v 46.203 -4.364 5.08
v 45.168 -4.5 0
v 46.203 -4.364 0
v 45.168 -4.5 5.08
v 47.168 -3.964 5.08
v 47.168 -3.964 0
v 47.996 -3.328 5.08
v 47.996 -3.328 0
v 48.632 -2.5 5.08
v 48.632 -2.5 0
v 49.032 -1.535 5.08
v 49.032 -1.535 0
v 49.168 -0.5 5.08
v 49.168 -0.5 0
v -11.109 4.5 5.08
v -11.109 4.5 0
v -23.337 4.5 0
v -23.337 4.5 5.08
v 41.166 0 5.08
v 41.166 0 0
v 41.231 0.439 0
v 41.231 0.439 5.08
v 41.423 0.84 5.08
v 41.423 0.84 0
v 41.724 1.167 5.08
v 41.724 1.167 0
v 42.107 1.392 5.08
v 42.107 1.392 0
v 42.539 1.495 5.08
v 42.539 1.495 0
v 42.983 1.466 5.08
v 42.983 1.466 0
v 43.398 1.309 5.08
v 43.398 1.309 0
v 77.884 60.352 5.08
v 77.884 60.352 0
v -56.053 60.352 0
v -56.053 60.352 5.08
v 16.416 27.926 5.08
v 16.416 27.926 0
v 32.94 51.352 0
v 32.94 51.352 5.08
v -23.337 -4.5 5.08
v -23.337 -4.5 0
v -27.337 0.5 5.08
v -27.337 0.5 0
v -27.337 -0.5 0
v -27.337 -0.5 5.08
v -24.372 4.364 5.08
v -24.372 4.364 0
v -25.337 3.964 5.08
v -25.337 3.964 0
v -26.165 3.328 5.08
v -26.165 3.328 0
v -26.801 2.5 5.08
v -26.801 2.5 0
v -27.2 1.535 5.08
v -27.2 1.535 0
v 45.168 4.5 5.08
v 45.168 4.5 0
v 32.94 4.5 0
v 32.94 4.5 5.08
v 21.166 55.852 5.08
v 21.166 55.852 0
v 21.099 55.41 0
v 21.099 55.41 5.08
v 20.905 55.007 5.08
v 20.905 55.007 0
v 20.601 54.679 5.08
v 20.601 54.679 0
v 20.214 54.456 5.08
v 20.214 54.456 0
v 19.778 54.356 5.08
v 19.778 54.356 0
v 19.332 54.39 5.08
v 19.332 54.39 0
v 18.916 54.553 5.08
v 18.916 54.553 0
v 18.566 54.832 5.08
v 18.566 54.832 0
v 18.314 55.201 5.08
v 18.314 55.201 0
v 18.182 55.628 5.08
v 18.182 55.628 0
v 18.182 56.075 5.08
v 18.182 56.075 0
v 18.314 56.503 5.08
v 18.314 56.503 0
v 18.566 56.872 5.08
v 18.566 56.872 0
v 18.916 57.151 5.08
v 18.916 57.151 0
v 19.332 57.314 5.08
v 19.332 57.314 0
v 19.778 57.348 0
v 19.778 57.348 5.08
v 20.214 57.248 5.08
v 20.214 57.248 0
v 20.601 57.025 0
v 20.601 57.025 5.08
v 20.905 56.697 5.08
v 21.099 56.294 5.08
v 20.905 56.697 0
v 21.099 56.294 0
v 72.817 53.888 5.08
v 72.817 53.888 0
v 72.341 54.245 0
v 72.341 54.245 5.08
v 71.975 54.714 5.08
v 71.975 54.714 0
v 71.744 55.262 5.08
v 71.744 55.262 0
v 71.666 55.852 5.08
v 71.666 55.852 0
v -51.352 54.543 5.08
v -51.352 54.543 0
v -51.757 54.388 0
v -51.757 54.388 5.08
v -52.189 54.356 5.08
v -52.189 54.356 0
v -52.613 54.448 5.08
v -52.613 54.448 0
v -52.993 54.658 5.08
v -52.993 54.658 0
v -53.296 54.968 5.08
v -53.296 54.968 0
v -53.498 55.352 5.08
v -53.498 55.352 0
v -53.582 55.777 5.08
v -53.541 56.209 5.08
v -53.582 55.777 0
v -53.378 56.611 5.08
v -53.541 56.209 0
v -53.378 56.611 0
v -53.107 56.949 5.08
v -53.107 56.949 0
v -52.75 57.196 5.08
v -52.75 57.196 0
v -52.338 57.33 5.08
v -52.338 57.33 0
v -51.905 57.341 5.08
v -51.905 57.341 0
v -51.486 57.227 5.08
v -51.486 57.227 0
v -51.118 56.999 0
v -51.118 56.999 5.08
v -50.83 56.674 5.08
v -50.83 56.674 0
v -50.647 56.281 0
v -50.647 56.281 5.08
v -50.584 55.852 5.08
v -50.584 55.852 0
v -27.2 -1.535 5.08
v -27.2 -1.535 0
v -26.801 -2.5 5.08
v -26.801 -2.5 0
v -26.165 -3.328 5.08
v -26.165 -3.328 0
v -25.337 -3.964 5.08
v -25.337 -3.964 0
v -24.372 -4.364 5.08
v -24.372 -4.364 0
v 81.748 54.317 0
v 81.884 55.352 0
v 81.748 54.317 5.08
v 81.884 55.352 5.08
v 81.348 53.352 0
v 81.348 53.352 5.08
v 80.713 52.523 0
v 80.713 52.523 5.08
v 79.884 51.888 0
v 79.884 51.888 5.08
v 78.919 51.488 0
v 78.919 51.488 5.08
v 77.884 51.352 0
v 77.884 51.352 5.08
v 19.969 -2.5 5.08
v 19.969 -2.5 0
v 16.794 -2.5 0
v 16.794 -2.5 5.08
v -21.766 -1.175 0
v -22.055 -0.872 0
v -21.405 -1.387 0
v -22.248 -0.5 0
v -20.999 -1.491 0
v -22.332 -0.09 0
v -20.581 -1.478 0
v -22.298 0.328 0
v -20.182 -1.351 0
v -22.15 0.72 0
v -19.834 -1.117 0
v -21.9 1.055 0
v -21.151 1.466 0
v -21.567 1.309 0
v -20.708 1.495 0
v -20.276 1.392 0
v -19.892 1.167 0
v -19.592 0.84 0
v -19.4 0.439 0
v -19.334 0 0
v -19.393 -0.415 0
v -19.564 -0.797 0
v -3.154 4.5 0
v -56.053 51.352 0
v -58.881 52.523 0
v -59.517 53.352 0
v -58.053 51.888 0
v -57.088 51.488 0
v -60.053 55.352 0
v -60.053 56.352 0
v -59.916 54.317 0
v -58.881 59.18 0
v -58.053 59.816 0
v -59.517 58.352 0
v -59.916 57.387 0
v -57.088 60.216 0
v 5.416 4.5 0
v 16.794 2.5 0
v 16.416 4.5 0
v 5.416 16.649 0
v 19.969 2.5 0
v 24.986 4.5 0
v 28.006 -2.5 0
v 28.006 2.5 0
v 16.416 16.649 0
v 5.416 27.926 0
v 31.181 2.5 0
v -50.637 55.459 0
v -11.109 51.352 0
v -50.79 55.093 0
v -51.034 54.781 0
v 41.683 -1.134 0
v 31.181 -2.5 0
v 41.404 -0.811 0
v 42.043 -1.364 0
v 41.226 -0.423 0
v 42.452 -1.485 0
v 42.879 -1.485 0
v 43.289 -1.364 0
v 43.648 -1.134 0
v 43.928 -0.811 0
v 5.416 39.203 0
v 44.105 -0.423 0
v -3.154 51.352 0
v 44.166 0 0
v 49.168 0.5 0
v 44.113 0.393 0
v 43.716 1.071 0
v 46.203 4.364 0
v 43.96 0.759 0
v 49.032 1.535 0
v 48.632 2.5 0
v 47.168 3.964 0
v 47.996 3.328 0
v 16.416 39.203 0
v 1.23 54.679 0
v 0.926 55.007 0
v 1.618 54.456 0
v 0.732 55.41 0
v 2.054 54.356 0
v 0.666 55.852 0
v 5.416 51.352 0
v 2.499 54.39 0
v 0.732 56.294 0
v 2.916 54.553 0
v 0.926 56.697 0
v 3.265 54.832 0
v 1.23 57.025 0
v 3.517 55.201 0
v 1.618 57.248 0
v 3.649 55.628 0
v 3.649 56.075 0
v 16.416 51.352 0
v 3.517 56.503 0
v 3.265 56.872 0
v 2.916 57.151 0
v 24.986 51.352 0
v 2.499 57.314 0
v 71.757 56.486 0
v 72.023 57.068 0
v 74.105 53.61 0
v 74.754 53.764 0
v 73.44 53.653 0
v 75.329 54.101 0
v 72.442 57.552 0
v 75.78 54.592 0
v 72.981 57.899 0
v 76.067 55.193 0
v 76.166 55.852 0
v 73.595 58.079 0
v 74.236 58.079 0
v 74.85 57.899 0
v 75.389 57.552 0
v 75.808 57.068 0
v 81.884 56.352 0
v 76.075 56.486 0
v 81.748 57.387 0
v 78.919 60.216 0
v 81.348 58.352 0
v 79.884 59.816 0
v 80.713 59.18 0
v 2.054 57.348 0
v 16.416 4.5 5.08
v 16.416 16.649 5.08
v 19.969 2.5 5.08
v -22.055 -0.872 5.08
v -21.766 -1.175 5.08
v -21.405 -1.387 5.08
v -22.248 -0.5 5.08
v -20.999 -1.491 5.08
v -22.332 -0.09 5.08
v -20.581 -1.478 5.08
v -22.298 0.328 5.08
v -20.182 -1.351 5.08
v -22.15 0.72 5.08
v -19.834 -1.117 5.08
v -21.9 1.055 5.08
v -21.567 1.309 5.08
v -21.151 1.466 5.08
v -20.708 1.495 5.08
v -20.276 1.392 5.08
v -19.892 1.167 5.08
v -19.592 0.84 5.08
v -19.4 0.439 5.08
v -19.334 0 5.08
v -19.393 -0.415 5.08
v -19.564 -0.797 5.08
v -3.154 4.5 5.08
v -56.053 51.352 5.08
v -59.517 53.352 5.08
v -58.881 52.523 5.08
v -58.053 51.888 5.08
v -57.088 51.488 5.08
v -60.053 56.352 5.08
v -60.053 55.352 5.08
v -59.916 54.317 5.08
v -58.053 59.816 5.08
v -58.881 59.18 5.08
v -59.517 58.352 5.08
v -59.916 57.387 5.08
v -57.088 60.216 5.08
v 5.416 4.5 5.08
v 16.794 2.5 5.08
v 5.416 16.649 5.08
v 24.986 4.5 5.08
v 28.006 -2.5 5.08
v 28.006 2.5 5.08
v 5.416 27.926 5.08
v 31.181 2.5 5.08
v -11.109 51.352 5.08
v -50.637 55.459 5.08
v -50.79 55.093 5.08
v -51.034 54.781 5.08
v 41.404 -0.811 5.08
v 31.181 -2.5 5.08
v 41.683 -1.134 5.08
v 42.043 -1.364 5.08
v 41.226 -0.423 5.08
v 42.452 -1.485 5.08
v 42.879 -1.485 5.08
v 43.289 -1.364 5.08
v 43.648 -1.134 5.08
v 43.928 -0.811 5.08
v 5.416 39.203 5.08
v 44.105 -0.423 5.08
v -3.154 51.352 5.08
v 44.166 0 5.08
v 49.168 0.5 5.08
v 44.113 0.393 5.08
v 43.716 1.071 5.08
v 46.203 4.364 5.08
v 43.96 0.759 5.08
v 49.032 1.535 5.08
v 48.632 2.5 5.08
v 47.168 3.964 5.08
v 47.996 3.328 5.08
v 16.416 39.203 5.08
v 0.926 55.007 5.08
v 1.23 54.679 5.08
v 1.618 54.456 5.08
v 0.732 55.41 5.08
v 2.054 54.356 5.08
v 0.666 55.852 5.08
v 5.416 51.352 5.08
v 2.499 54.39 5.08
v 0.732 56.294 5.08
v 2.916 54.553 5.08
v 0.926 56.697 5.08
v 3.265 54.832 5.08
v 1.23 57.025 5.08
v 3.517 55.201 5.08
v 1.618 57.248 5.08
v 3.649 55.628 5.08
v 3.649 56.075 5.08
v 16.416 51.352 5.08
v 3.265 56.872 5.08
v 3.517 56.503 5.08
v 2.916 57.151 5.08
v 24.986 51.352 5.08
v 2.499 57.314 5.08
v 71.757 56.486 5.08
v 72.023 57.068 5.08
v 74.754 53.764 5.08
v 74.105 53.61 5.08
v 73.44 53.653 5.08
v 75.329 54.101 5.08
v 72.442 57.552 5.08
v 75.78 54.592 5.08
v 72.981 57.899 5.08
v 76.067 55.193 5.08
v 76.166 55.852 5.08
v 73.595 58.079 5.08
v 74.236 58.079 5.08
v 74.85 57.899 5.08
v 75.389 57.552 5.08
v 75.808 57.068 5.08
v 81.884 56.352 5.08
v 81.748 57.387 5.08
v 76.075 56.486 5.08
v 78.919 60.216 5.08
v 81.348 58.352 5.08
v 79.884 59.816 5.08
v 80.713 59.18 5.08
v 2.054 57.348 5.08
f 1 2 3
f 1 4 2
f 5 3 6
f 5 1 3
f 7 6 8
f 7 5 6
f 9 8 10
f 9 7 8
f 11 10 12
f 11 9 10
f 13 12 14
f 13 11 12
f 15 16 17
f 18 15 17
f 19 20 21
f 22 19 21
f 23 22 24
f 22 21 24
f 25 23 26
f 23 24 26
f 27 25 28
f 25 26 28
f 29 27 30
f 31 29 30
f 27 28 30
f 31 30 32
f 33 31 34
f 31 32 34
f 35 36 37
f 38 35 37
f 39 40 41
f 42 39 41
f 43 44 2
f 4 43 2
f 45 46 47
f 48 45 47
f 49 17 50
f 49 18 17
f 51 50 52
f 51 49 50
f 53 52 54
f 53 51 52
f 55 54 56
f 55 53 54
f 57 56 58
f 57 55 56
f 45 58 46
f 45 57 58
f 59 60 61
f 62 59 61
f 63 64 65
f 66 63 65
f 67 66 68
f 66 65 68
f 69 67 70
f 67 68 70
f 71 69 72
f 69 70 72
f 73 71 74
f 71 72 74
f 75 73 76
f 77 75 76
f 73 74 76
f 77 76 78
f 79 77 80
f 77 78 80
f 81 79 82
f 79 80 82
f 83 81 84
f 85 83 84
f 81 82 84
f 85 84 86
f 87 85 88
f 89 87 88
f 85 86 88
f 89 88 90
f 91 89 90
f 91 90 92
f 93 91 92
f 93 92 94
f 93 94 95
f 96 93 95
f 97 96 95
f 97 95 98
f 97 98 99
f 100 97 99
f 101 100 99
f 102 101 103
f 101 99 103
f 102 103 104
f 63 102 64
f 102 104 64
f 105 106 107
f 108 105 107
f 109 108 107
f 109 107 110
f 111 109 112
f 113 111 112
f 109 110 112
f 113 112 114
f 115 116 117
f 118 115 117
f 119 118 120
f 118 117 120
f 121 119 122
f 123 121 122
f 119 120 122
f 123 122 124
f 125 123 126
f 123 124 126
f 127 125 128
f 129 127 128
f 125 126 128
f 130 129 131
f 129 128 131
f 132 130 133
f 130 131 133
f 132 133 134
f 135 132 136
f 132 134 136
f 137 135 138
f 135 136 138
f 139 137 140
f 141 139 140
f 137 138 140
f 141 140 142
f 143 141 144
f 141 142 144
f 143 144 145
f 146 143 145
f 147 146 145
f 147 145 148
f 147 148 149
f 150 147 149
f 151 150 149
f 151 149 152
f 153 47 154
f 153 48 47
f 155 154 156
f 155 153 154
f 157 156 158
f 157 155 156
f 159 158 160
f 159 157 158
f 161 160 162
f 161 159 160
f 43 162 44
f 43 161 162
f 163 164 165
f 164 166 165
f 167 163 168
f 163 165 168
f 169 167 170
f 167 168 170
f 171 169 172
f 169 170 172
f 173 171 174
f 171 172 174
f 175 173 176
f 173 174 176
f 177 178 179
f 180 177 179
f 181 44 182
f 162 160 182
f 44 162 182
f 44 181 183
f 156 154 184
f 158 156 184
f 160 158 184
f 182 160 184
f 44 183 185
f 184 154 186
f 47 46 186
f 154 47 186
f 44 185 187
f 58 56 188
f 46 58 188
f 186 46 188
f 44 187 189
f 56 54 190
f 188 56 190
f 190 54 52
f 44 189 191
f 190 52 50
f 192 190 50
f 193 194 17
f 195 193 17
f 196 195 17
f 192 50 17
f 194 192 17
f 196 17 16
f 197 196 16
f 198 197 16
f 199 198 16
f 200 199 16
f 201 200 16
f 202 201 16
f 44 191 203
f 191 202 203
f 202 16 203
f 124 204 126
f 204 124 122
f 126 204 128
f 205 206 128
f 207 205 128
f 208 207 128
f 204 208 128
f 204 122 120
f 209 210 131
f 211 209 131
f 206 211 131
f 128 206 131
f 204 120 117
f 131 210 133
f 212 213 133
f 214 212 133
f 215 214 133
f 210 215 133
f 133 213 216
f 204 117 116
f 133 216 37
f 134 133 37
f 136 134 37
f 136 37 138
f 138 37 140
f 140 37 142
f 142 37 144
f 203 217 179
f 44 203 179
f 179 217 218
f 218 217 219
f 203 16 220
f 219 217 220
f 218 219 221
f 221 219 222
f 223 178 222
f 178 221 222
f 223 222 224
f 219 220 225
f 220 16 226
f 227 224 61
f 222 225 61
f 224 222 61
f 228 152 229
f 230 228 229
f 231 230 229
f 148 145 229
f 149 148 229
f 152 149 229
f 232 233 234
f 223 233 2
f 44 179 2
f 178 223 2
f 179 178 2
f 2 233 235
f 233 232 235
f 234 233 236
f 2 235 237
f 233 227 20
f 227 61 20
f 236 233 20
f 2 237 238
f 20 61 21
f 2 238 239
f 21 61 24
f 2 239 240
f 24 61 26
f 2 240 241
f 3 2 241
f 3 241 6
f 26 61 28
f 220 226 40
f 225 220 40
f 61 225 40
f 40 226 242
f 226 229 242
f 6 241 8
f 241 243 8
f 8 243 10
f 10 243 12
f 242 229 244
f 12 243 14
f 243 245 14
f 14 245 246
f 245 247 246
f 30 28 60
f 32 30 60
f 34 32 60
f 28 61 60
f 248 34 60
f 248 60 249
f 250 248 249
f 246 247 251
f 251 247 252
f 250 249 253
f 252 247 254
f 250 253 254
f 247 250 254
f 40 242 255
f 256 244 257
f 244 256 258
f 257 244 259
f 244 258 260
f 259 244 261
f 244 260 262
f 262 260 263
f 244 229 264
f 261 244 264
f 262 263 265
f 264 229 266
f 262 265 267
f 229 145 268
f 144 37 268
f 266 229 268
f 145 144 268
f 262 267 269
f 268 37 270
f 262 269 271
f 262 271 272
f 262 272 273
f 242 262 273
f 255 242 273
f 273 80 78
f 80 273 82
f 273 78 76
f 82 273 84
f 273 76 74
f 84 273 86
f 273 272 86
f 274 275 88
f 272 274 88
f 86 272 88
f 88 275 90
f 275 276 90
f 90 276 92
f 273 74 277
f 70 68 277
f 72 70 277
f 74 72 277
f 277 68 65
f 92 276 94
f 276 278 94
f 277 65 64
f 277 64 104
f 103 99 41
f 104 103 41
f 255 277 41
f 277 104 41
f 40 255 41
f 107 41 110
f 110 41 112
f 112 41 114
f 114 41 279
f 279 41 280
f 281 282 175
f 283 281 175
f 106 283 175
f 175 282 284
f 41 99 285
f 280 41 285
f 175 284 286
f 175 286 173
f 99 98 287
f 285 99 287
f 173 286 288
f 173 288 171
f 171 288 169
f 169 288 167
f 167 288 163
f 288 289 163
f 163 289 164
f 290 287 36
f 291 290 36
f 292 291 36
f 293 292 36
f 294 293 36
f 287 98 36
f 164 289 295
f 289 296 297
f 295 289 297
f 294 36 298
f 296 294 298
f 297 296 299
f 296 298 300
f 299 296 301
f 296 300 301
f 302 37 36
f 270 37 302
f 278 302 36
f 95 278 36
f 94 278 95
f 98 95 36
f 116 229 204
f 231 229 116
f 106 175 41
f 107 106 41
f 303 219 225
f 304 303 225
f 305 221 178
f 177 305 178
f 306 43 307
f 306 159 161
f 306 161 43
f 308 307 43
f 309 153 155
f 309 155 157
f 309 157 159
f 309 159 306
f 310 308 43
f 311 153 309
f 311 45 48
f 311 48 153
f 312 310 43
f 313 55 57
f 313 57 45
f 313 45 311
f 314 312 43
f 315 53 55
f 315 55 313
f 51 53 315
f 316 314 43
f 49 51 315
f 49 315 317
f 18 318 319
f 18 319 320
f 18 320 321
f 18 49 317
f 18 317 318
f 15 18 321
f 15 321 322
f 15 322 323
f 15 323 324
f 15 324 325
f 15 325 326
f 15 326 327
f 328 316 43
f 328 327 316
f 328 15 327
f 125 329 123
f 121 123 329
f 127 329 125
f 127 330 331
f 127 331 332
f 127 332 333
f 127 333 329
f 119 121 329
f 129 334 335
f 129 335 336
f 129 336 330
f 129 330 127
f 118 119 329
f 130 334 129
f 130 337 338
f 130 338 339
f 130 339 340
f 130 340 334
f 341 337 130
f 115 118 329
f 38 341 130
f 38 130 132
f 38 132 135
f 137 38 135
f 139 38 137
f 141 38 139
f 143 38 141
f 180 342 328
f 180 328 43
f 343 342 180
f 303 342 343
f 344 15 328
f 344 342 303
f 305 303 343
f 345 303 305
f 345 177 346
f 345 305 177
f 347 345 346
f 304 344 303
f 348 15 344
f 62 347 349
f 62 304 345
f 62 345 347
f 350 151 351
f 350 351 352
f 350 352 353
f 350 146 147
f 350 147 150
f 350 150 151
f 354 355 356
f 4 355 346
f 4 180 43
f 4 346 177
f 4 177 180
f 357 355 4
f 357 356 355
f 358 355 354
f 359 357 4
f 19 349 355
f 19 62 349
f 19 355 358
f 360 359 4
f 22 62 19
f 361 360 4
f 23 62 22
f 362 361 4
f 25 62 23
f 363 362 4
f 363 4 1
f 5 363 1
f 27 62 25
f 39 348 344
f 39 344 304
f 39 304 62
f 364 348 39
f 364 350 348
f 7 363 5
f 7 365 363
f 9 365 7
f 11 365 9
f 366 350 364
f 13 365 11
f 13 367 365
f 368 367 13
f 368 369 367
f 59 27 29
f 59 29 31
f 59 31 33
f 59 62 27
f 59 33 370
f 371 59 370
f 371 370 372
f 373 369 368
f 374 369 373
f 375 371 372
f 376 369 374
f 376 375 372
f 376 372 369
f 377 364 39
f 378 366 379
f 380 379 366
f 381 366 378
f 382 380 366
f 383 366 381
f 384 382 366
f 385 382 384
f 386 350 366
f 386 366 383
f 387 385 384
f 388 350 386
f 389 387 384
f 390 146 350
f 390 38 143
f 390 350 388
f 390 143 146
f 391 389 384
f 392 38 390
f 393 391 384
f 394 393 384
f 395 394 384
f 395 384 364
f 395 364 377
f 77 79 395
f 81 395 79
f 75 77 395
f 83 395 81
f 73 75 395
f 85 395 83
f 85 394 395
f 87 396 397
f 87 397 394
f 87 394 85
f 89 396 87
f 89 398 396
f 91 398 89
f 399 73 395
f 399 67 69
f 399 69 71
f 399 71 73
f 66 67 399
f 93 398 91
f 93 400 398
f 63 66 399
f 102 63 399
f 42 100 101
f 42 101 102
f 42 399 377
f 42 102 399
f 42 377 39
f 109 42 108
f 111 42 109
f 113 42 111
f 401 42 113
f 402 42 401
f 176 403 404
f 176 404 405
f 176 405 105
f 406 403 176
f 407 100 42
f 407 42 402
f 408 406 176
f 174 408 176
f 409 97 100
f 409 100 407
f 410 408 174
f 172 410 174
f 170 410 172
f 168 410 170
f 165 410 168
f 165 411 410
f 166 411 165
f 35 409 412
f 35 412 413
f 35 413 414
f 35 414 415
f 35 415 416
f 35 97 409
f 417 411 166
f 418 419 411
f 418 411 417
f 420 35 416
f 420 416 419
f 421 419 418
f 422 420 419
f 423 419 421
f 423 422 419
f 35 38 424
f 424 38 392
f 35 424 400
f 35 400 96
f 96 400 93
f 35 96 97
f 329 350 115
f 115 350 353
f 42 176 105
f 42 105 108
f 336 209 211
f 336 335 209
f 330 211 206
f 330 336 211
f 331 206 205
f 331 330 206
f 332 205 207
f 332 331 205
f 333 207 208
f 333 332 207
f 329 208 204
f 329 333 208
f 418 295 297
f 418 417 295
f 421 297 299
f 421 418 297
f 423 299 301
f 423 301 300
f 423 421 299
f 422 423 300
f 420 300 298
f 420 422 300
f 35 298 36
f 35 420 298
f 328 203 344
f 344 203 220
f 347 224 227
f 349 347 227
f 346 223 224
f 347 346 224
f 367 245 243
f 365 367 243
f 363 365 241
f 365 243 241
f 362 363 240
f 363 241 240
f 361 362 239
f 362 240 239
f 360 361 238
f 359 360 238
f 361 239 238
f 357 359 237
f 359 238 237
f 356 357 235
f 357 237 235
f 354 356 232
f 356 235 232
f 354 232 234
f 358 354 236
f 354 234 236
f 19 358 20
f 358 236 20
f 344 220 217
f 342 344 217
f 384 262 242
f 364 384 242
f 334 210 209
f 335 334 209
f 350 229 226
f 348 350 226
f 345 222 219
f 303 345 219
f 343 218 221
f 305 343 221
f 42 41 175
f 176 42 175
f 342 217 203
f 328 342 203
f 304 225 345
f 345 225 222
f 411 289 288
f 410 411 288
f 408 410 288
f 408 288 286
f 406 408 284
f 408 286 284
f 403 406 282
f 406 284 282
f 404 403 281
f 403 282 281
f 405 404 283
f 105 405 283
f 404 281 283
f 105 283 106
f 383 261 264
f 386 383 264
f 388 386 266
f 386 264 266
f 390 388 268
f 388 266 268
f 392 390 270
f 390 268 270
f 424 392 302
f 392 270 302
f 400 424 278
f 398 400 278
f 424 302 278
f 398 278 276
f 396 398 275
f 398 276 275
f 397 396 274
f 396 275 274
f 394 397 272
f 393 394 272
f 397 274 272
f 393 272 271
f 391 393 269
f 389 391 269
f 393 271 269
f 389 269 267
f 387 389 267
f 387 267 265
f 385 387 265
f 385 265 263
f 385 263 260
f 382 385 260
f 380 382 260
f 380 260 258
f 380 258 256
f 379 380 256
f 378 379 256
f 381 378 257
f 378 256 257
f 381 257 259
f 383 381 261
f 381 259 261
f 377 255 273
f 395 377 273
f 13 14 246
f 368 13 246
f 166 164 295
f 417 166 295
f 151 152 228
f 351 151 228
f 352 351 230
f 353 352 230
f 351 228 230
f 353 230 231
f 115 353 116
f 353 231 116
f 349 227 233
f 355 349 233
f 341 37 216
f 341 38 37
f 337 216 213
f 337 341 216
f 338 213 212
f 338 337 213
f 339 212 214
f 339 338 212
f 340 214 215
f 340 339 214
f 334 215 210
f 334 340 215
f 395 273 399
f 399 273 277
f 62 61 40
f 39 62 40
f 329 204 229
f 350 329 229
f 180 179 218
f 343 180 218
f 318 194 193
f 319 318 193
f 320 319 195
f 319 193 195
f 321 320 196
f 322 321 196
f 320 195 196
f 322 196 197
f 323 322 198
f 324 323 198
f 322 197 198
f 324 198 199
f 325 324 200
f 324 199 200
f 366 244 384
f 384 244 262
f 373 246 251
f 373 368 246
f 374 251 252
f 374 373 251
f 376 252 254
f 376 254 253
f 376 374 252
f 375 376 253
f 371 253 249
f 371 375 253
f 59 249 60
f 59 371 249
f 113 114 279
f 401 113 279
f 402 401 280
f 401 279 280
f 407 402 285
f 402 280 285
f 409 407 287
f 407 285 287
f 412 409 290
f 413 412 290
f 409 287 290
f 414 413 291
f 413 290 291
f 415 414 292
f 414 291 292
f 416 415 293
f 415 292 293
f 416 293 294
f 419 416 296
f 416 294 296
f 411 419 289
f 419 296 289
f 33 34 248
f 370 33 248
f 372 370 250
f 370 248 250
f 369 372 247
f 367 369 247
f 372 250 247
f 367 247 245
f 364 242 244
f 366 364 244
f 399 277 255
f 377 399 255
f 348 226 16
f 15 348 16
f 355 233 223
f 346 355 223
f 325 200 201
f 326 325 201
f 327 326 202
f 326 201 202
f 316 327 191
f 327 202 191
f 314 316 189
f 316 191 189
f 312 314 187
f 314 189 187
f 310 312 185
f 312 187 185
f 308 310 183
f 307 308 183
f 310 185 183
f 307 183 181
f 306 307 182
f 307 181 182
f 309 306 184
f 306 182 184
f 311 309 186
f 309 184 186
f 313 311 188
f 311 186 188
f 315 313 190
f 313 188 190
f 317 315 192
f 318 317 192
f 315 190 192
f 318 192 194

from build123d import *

# Parameters (mm, degrees)
F1_DEPTH = 5.08
F2_R     = 4


# Not quite as in the source:
# - a feature names something its author has since deleted; it is built from what else it names


with BuildPart() as f1:
    # F0 (on Top) → F1 (new body)
    with BuildSketch(Plane.XY):
        with BuildLine():
            Line((0.6656670719, 55.8519247654), (-50.5843329281, 55.8519247654))
            ThreePointArc((-50.5843329281, 55.8519247654), (-50.7903791398, 55.0931866065), (-51.3519110531, 54.5428952787))
            Line((-51.3519110531, 54.5428952787), (-49.566514597, 51.3519247654))
            Line((-49.566514597, 51.3519247654), (-11.1088099211, 51.3519247654))
            Line((-11.1088099211, 51.3519247654), (-3.1543997556, 51.3519247654))
            Line((-3.1543997556, 51.3519247654), (5.4156670719, 51.3519247654))
            Line((5.4156670719, 51.3519247654), (10.9156670719, 51.3519247654))
            Line((10.9156670719, 51.3519247654), (10.9156670719, 55.8519247654))
            Line((10.9156670719, 55.8519247654), (3.6656670719, 55.8519247654))
            ThreePointArc((3.6656670719, 55.8519247654), (2.1656670719, 54.3519247654), (0.6656670719, 55.8519247654))
        make_face()
        with BuildLine():
            Line((-11.1088099211, 4.5), (-23.3521512592, 4.5))
            Line((-23.3521512592, 4.5), (-21.5667548031, 1.3090294867))
            ThreePointArc((-21.5667548031, 1.3090294867), (-20.0755947692, 1.2939537883), (-19.3343329281, 0))
            Line((-19.3343329281, 0), (10.9156670719, 0))
            Line((10.9156670719, 0), (10.9156670719, 4.5))
            Line((10.9156670719, 4.5), (5.4156670719, 4.5))
            Line((5.4156670719, 4.5), (-3.1543997556, 4.5))
            Line((-3.1543997556, 4.5), (-11.1088099211, 4.5))
        make_face()
        with BuildLine():
            ThreePointArc((-51.3519110531, 54.5428952787), (-53.3782867164, 56.6106629243), (-50.5843329281, 55.8519247654))
            Line((-50.5843329281, 55.8519247654), (0.6656670719, 55.8519247654))
            ThreePointArc((0.6656670719, 55.8519247654), (2.1656670719, 57.3519247654), (3.6656670719, 55.8519247654))
            Line((3.6656670719, 55.8519247654), (10.9156670719, 55.8519247654))
            Line((10.9156670719, 55.8519247654), (18.1656670719, 55.8519247654))
            ThreePointArc((18.1656670719, 55.8519247654), (19.6656670719, 57.3519247654), (21.1656670719, 55.8519247654))
            Line((21.1656670719, 55.8519247654), (71.6656670719, 55.8519247654))
            ThreePointArc((71.6656670719, 55.8519247654), (73.9156670719, 58.1019247654), (76.1656670719, 55.8519247654))
            ThreePointArc((76.1656670719, 55.8519247654), (75.0537743102, 53.910994083), (72.8170342594, 53.8883805354))
            Line((72.8170342594, 53.8883805354), (71.3978487408, 51.3519247654))
            Line((71.3978487408, 51.3519247654), (81.8841302488, 51.3519247654))
            Line((81.8841302488, 51.3519247654), (81.8841302488, 60.3519247654))
            Line((81.8841302488, 60.3519247654), (-60.052796105, 60.3519247654))
            Line((-60.052796105, 60.3519247654), (-60.052796105, 51.3519247654))
            Line((-60.052796105, 51.3519247654), (-49.566514597, 51.3519247654))
            Line((-49.566514597, 51.3519247654), (-51.3519110531, 54.5428952787))
        make_face()
        with BuildLine():
            Line((-21.5667548031, 1.3090294867), (-23.3521512592, 4.5))
            Line((-23.3521512592, 4.5), (-27.3365851734, 4.5))
            Line((-27.3365851734, 4.5), (-27.3365851734, -4.5))
            Line((-27.3365851734, -4.5), (49.1679193172, -4.5))
            Line((49.1679193172, -4.5), (49.1679193172, 4.5))
            Line((49.1679193172, 4.5), (45.183485403, 4.5))
            Line((45.183485403, 4.5), (43.3980889469, 1.3090294867))
            ThreePointArc((43.3980889469, 1.3090294867), (43.9596208602, 0.7587381589), (44.1656670719, 0))
            ThreePointArc((44.1656670719, 0), (42.6656670719, -1.5), (41.1656670719, 0))
            Line((41.1656670719, 0), (31.1806510627, 0))
            Line((31.1806510627, 0), (31.1806510627, -2.5))
            Line((31.1806510627, -2.5), (28.0056510627, -2.5))
            Line((28.0056510627, -2.5), (28.0056510627, 0))
            Line((28.0056510627, 0), (19.9686510627, 0))
            Line((19.9686510627, 0), (19.9686510627, -2.5))
            Line((19.9686510627, -2.5), (16.7936510627, -2.5))
            Line((16.7936510627, -2.5), (16.7936510627, 0))
            Line((16.7936510627, 0), (10.9156670719, 0))
            Line((10.9156670719, 0), (-19.3343329281, 0))
            ThreePointArc((-19.3343329281, 0), (-21.593071087, -1.2939537883), (-21.5667548031, 1.3090294867))
        make_face()
        with BuildLine():
            Line((10.9156670719, 4.5), (10.9156670719, 0))
            Line((10.9156670719, 0), (16.7936510627, 0))
            Line((16.7936510627, 0), (16.7936510627, 2.5))
            Line((16.7936510627, 2.5), (19.9686510627, 2.5))
            Line((19.9686510627, 2.5), (19.9686510627, 0))
            Line((19.9686510627, 0), (28.0056510627, 0))
            Line((28.0056510627, 0), (28.0056510627, 2.5))
            Line((28.0056510627, 2.5), (31.1806510627, 2.5))
            Line((31.1806510627, 2.5), (31.1806510627, 0))
            Line((31.1806510627, 0), (41.1656670719, 0))
            ThreePointArc((41.1656670719, 0), (41.906928913, 1.2939537883), (43.3980889469, 1.3090294867))
            Line((43.3980889469, 1.3090294867), (45.183485403, 4.5))
            Line((45.183485403, 4.5), (32.9401440649, 4.5))
            Line((32.9401440649, 4.5), (24.9857338994, 4.5))
            Line((24.9857338994, 4.5), (16.4156670719, 4.5))
            Line((16.4156670719, 4.5), (10.9156670719, 4.5))
        make_face()
        with BuildLine():
            Line((18.1656670719, 55.8519247654), (10.9156670719, 55.8519247654))
            Line((10.9156670719, 55.8519247654), (10.9156670719, 51.3519247654))
            Line((10.9156670719, 51.3519247654), (16.4156670719, 51.3519247654))
            Line((16.4156670719, 51.3519247654), (24.9857338994, 51.3519247654))
            Line((24.9857338994, 51.3519247654), (32.9401440649, 51.3519247654))
            Line((32.9401440649, 51.3519247654), (71.3978487408, 51.3519247654))
            Line((71.3978487408, 51.3519247654), (72.8170342594, 53.8883805354))
            ThreePointArc((72.8170342594, 53.8883805354), (71.9747363894, 54.7138175271), (71.6656670719, 55.8519247654))
            Line((71.6656670719, 55.8519247654), (21.1656670719, 55.8519247654))
            ThreePointArc((21.1656670719, 55.8519247654), (19.6656670719, 54.3519247654), (18.1656670719, 55.8519247654))
        make_face()
        Polygon((5.4156670719, 39.2025500407), (5.4156670719, 27.9259623827), (10.9156670719, 27.9259623827), (10.9156670719, 51.3519247654), (5.4156670719, 51.3519247654), align=None)
        Polygon((10.9156670719, 27.9259623827), (5.4156670719, 27.9259623827), (5.4156670719, 16.6493747247), (5.4156670719, 4.5), (10.9156670719, 4.5), align=None)
        Polygon((16.4156670719, 51.3519247654), (10.9156670719, 51.3519247654), (10.9156670719, 27.9259623827), (16.4156670719, 27.9259623827), (16.4156670719, 39.2025500407), align=None)
        Polygon((16.4156670719, 27.9259623827), (10.9156670719, 27.9259623827), (10.9156670719, 4.5), (16.4156670719, 4.5), (16.4156670719, 16.6493747247), align=None)
        Polygon((-3.1543997556, 51.3519247654), (-11.1088099211, 51.3519247654), (5.4156670719, 27.9259623827), (5.4156670719, 39.2025500407), align=None)
        Polygon((5.4156670719, 27.9259623827), (-11.1088099211, 4.5), (-3.1543997556, 4.5), (5.4156670719, 16.6493747247), align=None)
        Polygon((32.9401440649, 4.5), (16.4156670719, 27.9259623827), (16.4156670719, 16.6493747247), (24.9857338994, 4.5), align=None)
        Polygon((16.4156670719, 39.2025500407), (16.4156670719, 27.9259623827), (32.9401440649, 51.3519247654), (24.9857338994, 51.3519247654), align=None)
    extrude(amount=F1_DEPTH)

    # F2
    f2_edges = [f1.edges().sort_by_distance(p)[0] for p in [
        (-60.052796, 60.351925, 2.54),
        (-60.052796, 51.351925, 2.54),
        (81.88413, 60.351925, 2.54),
        (81.88413, 51.351925, 2.54),
        (49.167919, 4.5, 2.54),
        (49.167919, -4.5, 2.54),
        (-27.336585, 4.5, 2.54),
        (-27.336585, -4.5, 2.54),
    ]]
    fillet(f2_edges, radius=F2_R)


solid = f1.part
